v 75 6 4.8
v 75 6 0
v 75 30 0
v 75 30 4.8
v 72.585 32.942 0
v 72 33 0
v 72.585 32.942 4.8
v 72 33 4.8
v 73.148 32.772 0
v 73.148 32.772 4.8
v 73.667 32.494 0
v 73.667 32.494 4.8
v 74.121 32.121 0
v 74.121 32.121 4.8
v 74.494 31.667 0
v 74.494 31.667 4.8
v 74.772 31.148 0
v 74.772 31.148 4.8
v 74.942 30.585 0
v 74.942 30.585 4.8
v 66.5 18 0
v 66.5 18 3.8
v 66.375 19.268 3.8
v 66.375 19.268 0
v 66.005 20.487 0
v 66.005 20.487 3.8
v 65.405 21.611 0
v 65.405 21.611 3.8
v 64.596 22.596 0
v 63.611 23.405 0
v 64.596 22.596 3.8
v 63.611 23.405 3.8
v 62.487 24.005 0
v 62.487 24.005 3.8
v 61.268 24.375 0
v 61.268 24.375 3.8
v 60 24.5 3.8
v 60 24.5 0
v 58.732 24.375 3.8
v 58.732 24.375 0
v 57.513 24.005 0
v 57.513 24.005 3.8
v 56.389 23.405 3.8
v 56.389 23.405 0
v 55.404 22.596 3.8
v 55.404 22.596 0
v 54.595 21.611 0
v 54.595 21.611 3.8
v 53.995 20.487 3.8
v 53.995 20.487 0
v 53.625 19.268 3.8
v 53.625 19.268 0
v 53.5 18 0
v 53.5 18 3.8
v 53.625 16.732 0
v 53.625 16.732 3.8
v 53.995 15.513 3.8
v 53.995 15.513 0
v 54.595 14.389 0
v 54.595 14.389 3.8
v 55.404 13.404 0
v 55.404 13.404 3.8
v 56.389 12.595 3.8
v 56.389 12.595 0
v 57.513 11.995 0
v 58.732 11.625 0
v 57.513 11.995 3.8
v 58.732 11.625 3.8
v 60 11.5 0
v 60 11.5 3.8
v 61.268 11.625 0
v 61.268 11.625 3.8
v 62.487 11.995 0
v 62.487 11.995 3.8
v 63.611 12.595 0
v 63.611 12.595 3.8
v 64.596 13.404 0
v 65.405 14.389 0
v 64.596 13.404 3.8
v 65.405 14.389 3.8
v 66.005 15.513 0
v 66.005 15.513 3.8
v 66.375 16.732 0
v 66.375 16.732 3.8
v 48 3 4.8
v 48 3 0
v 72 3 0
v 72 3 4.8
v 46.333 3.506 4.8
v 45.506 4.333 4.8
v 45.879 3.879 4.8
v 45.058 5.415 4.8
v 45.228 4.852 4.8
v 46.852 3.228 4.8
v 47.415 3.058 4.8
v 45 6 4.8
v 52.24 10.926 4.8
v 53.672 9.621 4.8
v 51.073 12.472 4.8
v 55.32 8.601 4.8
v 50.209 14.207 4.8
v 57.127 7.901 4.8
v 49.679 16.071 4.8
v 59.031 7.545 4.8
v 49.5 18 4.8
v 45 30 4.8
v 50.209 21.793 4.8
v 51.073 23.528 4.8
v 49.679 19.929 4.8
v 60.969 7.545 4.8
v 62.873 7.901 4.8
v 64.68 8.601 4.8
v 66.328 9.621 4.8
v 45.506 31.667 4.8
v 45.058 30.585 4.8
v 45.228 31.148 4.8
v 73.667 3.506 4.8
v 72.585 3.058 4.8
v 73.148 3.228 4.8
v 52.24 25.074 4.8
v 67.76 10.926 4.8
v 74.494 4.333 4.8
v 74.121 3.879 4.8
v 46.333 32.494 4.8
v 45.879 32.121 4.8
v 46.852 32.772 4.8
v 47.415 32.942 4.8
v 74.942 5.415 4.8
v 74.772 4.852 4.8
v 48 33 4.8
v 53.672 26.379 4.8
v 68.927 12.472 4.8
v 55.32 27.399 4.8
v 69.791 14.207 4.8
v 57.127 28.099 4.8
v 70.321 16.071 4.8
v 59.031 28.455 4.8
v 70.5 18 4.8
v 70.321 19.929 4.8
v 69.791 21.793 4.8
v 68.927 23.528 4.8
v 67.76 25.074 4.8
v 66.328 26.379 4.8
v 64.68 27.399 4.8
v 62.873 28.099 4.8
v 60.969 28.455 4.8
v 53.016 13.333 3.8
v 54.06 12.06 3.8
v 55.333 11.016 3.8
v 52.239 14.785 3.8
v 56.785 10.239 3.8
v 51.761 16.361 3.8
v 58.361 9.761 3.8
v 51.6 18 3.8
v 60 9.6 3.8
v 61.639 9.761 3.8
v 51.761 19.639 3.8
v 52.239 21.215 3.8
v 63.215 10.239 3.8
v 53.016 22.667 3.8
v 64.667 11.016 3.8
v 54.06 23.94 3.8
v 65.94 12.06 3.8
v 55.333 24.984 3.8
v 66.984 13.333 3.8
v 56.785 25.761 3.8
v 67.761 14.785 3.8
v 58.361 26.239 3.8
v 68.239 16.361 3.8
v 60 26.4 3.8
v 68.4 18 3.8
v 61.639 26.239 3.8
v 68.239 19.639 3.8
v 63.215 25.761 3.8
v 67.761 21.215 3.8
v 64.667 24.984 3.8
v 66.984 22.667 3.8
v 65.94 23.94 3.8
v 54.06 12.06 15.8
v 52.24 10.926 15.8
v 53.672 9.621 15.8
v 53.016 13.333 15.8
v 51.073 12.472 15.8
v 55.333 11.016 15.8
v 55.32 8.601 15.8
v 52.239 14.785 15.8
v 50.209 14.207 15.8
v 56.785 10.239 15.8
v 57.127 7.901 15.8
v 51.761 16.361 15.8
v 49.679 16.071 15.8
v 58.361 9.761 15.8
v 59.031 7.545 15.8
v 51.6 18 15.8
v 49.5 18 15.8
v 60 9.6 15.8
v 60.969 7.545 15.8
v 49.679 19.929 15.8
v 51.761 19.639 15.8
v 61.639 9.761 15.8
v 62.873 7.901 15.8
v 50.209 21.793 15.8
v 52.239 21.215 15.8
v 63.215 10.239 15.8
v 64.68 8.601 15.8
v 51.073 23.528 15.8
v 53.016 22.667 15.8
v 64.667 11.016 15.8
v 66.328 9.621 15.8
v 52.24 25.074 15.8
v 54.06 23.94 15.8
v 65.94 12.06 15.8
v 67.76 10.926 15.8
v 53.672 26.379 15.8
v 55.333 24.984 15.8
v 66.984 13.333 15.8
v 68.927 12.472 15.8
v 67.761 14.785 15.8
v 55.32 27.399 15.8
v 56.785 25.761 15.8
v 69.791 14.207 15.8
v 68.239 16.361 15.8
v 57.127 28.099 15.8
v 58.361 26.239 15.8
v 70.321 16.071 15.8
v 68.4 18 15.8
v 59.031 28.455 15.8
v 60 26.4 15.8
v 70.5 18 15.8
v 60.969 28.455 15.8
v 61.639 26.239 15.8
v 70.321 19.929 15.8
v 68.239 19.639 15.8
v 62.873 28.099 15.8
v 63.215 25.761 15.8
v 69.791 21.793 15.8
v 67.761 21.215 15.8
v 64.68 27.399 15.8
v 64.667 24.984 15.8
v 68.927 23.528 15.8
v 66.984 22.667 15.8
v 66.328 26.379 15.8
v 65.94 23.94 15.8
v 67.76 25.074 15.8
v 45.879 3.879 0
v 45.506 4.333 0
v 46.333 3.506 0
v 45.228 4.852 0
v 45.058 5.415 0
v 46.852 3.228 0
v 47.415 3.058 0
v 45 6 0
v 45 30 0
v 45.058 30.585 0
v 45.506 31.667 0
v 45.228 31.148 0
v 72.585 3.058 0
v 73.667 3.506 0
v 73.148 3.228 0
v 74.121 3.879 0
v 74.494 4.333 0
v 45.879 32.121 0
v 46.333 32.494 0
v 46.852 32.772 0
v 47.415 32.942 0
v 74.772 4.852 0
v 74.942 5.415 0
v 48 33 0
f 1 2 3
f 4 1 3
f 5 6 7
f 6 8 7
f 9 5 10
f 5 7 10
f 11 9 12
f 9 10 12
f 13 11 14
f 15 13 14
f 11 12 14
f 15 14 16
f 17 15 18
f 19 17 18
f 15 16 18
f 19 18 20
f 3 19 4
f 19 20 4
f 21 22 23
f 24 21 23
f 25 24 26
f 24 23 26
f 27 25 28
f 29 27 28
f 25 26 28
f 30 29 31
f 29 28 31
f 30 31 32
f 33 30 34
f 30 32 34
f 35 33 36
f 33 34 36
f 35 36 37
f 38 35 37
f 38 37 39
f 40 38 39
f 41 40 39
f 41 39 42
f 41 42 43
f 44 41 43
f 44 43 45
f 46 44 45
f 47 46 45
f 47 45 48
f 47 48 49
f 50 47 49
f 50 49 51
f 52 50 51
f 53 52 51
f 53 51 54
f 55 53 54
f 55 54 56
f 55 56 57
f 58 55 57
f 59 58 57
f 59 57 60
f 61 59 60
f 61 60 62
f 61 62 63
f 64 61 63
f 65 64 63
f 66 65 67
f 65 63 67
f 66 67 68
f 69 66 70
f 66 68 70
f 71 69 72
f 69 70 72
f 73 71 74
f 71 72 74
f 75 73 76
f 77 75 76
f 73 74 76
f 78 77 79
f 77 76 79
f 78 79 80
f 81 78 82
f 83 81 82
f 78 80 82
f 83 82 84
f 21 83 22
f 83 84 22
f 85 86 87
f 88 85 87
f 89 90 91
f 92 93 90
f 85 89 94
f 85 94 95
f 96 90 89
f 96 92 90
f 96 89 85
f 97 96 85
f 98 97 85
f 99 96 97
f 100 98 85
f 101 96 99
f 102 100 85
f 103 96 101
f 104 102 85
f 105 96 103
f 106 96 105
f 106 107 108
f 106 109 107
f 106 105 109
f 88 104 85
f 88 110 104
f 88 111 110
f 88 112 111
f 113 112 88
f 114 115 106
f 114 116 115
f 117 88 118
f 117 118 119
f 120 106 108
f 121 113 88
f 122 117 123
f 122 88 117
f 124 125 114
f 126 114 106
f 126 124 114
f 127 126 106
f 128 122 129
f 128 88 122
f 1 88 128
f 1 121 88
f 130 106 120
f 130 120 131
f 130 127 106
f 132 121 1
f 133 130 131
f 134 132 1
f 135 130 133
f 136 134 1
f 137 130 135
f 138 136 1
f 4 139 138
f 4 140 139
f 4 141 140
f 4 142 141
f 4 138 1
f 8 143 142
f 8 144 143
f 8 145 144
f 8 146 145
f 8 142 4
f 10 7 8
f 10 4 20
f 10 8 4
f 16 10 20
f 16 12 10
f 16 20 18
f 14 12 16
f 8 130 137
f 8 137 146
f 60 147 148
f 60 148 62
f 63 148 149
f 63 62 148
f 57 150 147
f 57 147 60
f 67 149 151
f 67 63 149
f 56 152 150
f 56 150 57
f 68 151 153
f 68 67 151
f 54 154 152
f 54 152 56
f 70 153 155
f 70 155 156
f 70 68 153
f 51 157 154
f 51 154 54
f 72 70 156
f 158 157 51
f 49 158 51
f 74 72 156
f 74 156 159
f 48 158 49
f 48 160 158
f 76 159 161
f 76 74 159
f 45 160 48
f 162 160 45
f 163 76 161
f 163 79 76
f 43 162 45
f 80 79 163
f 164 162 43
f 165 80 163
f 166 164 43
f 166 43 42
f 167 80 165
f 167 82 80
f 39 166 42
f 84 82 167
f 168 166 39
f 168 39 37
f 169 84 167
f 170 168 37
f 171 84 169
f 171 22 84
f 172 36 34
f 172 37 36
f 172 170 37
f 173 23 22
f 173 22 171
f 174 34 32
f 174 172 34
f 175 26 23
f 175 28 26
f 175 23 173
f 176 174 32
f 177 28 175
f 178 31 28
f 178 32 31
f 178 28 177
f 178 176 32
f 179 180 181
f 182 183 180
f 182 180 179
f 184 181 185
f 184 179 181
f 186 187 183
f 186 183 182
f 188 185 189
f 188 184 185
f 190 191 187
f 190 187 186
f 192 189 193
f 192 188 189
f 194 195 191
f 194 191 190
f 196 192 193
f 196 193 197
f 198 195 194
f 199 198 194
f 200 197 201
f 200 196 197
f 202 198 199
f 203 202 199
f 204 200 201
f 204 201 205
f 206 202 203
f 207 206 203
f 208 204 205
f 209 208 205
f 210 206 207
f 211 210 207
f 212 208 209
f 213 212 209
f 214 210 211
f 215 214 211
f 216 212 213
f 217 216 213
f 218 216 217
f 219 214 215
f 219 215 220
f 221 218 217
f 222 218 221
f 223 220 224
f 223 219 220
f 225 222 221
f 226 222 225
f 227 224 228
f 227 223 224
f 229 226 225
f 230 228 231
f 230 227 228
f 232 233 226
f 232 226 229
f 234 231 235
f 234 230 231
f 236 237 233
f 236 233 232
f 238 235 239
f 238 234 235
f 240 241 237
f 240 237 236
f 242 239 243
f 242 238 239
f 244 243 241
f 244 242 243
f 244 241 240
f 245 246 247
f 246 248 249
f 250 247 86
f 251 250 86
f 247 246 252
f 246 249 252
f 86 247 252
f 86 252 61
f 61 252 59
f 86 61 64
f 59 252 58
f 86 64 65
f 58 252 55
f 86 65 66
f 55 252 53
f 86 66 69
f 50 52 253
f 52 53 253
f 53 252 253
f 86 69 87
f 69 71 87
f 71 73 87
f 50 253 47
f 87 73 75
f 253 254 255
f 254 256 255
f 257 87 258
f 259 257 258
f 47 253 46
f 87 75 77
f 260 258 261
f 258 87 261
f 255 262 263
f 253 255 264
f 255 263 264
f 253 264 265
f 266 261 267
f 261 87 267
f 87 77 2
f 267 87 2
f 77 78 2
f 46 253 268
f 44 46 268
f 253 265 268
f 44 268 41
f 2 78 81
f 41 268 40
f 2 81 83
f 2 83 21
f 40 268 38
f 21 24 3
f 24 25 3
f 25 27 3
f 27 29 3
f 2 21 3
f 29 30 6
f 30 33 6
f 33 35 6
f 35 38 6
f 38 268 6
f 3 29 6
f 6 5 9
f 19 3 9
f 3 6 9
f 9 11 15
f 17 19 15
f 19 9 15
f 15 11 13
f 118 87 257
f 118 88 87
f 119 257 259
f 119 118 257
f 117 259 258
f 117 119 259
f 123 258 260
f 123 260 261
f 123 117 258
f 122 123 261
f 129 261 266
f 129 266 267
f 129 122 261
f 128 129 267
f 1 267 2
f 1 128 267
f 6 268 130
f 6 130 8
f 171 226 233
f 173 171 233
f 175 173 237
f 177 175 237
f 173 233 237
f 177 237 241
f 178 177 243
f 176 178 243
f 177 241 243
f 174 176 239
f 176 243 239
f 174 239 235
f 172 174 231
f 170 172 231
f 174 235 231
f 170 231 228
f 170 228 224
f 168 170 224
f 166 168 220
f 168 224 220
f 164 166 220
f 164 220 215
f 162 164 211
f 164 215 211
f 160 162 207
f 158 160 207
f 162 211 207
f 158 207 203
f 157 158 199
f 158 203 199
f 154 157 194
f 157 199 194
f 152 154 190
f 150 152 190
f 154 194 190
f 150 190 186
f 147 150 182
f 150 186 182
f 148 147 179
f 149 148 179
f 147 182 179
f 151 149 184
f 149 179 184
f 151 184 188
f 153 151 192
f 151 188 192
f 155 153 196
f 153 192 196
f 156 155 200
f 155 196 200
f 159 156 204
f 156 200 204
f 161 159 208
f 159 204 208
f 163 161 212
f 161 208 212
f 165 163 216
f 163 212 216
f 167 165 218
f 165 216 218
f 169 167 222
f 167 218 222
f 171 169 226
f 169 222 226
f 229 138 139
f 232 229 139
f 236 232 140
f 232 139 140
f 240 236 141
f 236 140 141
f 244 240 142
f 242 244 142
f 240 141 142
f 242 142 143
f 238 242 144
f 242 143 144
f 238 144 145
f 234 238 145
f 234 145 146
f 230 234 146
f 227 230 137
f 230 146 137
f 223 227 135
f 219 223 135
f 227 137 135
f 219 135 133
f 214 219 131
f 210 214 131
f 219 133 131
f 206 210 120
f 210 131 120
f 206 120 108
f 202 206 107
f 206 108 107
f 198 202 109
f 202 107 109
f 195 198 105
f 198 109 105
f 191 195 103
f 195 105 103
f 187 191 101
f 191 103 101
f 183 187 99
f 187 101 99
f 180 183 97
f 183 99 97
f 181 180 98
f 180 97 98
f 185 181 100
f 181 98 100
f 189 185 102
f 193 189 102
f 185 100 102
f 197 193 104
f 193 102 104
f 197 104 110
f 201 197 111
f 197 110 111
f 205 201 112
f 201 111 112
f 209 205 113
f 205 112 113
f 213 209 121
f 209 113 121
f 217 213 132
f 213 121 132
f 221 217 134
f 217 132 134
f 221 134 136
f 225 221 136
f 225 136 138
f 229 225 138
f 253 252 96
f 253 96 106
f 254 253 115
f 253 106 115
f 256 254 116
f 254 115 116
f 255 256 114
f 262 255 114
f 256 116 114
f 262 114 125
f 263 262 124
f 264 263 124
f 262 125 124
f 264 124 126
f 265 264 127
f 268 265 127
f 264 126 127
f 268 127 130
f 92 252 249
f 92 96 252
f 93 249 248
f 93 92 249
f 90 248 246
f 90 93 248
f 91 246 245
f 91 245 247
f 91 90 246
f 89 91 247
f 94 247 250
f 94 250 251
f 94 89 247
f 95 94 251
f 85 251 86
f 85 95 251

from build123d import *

# Parameters (mm, degrees)
SKETCH006_W     = 30
SKETCH006_H     = 30
PAD003_DEPTH    = 4.8
SKETCH007_R     = 10.5
PAD004_DEPTH    = 11
SKETCH008_R     = 8.4
POCKET003_DEPTH = 12
SKETCH011_R     = 6.5
POCKET004_DEPTH = 3.801
FILLET002_R     = 3


with BuildPart() as part:
    # Sketch006 → Pad003 (new body)
    with BuildSketch(Plane.XY):
        Rectangle(SKETCH006_W, SKETCH006_H)
    extrude(amount=PAD003_DEPTH)

    # Sketch007 (on Face6 of Pad003) → Pad004 (join)
    with BuildSketch(Plane.XY.offset(4.8)):
        Circle(SKETCH007_R)
    extrude(amount=PAD004_DEPTH)

    # Sketch008 (on Face8 of Pad004) → Pocket003 (cut)
    with BuildSketch(Plane.XY.offset(15.8)):
        Circle(SKETCH008_R)
    extrude(amount=-POCKET003_DEPTH, mode=Mode.SUBTRACT)

    # Sketch011 (on Face10 of Pocket003) → Pocket004 (cut, through all)
    with BuildSketch(Plane.XY.offset(3.8)):
        Circle(SKETCH011_R)
    extrude(amount=-POCKET004_DEPTH, mode=Mode.SUBTRACT)

    # Fillet002
    fillet002_edges = [part.edges().sort_by_distance(p)[0] for p in [
        (15, -15, 2.4),
        (-15, -15, 2.4),
        (15, 15, 2.4),
        (-15, 15, 2.4),
    ]]
    fillet(fillet002_edges, radius=FILLET002_R)


with BuildPart() as part_1:
    # Body003 placement: moved
    add(part.part.moved(Location((60, 18, 0))))


solid = part_1.part
